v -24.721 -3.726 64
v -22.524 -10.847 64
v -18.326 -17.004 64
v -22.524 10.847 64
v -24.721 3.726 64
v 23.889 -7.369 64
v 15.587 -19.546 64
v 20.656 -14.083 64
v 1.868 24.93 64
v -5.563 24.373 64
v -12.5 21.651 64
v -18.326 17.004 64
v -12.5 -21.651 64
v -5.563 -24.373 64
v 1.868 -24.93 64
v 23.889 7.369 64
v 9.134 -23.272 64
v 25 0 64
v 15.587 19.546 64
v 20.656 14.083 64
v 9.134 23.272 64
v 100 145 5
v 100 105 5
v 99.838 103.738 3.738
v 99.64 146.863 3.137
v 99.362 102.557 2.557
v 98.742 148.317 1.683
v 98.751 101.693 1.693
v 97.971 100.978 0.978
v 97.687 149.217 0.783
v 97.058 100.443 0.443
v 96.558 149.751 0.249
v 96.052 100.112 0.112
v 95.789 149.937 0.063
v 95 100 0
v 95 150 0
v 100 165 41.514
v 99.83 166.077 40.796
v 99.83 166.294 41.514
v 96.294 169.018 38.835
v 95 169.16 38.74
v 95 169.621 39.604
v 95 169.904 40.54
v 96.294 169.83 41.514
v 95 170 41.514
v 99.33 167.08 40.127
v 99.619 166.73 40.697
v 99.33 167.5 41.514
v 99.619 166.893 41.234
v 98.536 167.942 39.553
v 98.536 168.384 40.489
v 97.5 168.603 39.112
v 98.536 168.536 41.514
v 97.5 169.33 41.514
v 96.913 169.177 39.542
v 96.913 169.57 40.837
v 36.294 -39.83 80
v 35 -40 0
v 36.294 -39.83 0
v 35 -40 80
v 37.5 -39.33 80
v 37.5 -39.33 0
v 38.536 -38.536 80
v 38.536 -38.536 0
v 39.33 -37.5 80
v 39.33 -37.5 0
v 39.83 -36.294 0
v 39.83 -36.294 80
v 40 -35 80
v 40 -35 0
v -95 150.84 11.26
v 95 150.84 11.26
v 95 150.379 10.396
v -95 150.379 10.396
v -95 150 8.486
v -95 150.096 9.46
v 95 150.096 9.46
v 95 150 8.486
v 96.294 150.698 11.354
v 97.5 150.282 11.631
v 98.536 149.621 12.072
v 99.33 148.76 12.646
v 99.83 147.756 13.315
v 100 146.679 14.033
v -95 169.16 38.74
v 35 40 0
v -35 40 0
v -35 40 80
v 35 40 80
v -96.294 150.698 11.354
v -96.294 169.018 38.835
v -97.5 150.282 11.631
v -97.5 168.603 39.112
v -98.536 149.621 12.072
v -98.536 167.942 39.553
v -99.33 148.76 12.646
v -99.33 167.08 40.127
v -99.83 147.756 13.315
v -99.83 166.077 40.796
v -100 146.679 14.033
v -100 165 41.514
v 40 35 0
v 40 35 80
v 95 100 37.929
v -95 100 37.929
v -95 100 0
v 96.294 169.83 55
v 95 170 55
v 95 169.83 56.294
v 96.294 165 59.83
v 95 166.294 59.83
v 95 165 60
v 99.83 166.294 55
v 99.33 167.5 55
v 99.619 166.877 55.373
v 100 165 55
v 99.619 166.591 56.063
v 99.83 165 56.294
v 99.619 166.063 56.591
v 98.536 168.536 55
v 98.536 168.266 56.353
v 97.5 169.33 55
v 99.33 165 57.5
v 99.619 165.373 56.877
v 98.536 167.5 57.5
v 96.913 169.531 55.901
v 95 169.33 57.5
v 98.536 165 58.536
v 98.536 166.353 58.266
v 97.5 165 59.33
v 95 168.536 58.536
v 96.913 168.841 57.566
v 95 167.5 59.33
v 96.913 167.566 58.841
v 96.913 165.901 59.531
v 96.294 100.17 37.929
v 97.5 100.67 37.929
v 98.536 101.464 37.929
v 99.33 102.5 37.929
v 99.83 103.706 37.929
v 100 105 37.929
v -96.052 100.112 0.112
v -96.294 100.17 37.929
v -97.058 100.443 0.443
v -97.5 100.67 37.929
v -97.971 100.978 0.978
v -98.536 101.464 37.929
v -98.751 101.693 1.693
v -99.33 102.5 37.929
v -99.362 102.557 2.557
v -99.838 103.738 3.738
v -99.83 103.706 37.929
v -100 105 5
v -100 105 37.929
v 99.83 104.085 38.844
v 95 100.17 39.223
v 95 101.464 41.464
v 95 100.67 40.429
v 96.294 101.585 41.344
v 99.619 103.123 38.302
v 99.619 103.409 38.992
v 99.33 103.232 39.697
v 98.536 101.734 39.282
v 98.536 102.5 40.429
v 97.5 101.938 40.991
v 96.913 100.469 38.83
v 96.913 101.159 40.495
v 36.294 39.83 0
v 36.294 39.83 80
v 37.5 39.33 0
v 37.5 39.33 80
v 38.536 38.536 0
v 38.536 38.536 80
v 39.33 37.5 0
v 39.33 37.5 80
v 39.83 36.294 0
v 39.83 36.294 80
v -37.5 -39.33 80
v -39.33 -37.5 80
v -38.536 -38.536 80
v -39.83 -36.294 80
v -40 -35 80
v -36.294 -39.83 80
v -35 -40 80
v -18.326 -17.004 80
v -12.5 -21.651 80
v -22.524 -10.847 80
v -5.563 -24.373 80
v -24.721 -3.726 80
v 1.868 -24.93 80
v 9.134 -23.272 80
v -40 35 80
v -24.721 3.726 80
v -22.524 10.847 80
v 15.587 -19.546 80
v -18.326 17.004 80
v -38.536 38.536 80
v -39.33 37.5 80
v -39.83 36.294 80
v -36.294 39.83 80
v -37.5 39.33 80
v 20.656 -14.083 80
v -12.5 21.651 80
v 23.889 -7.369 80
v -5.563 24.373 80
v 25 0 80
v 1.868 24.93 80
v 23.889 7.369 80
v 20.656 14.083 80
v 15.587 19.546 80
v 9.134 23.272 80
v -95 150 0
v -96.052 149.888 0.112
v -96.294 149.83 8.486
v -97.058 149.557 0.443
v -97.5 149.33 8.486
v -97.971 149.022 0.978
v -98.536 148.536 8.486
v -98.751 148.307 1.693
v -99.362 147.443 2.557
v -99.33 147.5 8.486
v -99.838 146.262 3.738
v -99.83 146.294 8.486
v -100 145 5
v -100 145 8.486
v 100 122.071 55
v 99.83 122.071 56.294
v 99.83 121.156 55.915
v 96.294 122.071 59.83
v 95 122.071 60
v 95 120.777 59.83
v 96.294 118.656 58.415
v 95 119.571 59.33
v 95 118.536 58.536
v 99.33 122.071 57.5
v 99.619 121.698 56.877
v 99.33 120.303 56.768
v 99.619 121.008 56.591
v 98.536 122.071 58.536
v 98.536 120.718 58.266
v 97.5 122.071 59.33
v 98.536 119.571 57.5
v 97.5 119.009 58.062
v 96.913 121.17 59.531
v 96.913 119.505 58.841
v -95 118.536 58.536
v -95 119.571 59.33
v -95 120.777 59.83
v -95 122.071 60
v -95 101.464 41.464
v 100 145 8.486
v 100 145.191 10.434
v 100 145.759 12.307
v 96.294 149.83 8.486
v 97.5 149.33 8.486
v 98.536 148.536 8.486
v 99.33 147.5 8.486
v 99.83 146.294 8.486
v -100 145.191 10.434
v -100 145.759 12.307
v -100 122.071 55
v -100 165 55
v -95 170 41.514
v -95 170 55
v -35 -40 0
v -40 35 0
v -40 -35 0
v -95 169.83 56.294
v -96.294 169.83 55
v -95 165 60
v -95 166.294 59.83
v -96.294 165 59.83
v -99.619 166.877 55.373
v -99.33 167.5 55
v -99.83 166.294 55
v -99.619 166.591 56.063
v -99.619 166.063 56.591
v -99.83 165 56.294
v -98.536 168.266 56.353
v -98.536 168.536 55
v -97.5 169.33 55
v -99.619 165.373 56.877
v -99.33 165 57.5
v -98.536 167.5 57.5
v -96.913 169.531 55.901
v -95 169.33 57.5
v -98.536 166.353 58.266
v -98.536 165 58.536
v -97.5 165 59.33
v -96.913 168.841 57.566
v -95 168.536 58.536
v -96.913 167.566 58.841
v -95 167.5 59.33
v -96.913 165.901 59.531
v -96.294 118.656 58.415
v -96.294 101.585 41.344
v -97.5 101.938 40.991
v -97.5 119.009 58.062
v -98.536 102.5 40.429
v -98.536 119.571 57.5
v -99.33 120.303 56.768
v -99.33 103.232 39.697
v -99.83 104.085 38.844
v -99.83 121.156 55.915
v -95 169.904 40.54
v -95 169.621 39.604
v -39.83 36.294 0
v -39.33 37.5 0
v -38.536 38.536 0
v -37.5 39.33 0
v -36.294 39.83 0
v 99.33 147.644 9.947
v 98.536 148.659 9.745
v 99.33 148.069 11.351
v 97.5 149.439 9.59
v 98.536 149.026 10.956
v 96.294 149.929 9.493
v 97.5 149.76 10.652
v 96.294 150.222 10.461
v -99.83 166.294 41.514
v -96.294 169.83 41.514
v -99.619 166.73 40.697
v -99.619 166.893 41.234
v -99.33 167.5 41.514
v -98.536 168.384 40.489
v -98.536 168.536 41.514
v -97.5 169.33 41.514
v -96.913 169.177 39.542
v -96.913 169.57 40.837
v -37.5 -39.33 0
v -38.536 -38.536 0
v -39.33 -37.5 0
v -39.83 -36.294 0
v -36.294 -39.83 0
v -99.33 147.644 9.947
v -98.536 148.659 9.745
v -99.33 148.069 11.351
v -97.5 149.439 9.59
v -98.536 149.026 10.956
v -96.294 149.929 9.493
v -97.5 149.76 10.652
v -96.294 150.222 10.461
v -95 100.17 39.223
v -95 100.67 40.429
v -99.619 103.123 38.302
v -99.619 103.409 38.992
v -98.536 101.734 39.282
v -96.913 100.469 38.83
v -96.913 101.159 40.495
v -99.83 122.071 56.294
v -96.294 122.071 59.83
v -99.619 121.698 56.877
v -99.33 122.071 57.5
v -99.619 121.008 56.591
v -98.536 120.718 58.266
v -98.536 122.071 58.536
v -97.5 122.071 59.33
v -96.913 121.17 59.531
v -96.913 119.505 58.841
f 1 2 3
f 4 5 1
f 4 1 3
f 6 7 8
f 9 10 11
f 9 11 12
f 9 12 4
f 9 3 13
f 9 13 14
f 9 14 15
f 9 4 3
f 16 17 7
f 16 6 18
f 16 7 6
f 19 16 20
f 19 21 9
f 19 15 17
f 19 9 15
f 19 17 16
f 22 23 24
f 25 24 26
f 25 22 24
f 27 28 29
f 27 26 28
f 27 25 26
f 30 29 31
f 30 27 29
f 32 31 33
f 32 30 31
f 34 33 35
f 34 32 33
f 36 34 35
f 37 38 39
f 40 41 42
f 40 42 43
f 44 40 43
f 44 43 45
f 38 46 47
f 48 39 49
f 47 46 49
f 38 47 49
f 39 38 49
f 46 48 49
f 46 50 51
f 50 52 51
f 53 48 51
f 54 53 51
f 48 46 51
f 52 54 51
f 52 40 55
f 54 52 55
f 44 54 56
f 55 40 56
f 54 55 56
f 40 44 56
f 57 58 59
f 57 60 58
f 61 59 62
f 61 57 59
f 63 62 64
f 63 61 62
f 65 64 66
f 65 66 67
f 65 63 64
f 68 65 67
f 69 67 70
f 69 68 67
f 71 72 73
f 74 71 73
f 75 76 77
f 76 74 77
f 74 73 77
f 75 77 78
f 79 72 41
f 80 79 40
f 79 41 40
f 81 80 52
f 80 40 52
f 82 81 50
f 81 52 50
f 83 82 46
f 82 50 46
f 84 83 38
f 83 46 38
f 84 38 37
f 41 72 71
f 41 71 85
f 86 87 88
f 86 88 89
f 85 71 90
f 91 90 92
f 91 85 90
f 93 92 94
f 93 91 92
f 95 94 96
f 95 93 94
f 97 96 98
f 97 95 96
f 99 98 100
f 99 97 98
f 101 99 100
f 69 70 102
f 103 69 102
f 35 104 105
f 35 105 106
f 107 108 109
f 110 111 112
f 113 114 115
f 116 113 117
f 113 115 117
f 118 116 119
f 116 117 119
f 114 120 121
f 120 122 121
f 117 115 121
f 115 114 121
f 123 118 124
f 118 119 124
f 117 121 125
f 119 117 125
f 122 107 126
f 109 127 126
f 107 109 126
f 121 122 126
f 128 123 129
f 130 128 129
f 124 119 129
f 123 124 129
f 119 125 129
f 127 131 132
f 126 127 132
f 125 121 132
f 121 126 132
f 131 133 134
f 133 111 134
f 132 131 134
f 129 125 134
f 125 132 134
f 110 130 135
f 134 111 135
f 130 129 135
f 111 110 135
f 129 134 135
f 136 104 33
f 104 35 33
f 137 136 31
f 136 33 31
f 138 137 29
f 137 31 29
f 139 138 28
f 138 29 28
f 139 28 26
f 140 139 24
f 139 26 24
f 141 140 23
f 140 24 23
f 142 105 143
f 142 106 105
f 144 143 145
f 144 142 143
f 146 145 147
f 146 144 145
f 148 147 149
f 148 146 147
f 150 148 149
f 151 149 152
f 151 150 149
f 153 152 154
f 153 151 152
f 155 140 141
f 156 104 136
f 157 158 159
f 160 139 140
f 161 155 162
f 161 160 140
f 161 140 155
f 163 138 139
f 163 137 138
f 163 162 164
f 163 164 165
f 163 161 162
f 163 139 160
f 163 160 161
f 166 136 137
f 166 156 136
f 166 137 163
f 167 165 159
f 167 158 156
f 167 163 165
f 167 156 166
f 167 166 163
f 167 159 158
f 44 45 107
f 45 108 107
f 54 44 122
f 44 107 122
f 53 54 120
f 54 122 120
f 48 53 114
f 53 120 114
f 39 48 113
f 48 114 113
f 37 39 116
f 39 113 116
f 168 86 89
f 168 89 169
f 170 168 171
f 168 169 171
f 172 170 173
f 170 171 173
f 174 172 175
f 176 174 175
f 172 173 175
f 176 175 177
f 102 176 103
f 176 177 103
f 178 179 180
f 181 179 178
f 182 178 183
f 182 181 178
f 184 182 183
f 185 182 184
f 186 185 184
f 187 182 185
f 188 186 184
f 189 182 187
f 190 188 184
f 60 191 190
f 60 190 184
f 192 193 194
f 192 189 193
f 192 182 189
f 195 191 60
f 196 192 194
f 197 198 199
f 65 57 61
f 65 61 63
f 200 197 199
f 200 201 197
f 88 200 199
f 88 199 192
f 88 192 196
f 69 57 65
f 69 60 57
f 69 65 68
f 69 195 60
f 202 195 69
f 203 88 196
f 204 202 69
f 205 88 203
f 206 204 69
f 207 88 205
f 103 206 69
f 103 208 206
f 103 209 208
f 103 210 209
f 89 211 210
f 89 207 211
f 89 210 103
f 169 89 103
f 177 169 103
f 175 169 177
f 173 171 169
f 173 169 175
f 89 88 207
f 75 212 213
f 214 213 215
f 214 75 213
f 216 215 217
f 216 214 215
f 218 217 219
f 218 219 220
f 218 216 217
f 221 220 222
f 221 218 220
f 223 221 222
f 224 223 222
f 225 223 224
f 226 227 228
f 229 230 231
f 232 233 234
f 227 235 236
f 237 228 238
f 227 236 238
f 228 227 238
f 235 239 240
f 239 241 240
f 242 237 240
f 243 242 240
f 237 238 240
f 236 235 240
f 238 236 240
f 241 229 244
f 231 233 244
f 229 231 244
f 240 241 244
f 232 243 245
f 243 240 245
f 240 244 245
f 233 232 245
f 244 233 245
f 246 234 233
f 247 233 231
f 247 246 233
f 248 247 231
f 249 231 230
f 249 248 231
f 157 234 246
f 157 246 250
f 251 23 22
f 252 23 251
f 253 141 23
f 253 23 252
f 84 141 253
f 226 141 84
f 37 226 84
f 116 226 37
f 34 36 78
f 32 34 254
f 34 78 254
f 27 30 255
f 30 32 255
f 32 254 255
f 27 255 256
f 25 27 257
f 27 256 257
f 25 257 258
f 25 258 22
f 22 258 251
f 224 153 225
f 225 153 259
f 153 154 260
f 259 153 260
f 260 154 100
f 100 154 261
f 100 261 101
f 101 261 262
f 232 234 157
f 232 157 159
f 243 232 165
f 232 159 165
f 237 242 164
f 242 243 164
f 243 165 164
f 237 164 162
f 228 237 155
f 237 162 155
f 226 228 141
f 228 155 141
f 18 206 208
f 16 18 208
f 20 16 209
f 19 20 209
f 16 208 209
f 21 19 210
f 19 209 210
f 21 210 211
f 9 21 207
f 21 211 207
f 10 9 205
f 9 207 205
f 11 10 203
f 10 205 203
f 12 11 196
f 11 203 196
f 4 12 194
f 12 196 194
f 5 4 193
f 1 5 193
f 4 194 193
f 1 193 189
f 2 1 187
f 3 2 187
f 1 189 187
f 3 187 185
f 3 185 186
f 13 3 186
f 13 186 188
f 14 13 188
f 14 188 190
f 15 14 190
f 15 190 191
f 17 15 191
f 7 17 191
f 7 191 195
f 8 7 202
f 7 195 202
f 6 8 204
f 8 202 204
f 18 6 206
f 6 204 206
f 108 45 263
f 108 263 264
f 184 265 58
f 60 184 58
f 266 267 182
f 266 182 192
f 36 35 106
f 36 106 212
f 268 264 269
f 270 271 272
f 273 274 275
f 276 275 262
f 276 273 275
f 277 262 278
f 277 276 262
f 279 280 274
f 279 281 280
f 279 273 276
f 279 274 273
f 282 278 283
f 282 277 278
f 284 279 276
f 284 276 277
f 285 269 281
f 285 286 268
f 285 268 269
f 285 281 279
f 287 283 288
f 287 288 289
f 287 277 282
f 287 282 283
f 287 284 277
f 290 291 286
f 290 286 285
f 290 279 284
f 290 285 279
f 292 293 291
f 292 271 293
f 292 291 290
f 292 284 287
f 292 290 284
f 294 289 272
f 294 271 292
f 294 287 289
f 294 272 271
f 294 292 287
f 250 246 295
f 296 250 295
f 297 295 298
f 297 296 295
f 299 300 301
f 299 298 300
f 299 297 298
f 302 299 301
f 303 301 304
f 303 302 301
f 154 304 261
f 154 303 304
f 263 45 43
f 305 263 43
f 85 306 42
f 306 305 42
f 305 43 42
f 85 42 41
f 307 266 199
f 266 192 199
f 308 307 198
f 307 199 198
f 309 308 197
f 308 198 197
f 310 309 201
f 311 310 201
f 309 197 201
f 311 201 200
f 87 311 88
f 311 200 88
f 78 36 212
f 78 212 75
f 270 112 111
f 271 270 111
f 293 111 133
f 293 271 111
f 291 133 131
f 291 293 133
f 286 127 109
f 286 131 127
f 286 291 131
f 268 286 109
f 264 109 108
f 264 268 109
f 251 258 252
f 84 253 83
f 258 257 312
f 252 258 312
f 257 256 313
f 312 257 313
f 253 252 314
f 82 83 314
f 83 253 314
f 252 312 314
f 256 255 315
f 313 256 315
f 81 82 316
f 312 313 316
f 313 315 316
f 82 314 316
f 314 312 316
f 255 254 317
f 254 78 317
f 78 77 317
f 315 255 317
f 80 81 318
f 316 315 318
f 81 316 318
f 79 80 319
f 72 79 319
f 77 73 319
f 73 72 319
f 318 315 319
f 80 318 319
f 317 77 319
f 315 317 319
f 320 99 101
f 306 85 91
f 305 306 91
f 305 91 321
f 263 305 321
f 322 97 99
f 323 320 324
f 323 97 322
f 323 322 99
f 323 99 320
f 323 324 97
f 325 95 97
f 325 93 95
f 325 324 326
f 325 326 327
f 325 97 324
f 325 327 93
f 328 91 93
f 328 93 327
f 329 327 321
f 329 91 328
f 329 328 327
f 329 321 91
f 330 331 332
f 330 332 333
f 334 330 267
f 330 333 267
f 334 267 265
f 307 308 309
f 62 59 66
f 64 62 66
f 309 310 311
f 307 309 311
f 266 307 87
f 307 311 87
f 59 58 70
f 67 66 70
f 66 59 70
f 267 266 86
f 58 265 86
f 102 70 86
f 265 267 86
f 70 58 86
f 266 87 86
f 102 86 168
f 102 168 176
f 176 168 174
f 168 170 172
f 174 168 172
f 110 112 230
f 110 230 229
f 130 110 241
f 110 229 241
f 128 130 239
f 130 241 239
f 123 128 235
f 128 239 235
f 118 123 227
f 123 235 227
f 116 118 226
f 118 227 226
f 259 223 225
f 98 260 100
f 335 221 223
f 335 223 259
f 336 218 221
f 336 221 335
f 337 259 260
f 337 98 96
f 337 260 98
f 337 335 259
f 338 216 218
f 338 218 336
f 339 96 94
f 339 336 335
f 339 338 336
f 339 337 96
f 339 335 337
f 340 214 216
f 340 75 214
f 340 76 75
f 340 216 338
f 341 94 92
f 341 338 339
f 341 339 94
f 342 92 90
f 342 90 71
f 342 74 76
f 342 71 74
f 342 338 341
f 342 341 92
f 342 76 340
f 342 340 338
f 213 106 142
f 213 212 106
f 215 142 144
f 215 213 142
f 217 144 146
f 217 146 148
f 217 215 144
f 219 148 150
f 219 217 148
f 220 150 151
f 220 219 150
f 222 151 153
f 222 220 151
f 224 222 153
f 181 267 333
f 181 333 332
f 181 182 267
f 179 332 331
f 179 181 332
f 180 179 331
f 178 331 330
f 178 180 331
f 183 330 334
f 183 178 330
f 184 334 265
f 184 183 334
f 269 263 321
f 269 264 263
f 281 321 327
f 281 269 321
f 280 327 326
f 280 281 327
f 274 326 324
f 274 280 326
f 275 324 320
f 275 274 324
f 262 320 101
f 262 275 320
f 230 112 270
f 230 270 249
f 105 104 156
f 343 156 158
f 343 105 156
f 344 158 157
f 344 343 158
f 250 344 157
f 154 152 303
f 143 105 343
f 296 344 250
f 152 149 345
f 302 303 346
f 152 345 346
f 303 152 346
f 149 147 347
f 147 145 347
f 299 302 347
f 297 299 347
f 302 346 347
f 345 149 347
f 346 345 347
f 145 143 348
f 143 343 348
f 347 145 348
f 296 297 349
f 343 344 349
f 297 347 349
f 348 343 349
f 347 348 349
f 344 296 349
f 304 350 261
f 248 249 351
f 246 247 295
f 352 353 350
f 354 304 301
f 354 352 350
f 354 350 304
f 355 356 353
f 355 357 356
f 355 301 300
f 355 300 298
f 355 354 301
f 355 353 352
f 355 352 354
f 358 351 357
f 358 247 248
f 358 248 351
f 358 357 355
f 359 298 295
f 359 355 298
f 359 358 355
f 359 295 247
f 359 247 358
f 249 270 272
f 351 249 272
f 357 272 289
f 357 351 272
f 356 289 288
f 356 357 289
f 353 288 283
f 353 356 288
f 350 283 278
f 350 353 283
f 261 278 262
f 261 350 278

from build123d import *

# Parameters (mm, degrees)
F0_W          = 80
F0_H          = 80
F1_DEPTH      = 80
F2_R          = 25
F3_DEPTH      = 16
F4_R          = 5
F6_DEPTH      = 100
F6_DEPTH_BACK = 100
F7_R          = 5


with BuildPart() as f1:
    # F0 (on Top) → F1 (new body)
    with BuildSketch(Plane.XY):
        Rectangle(F0_W, F0_H)
    extrude(amount=F1_DEPTH)

    # F2 (on face) → F3 (cut)
    with BuildSketch(Plane.XY.offset(80)):
        Circle(F2_R)
    extrude(amount=-F3_DEPTH, mode=Mode.SUBTRACT)

    # F4
    f4_edges = [f1.edges().sort_by_distance(p)[0] for p in [
        (-40, -40, 40),
        (-40, 40, 40),
        (40, 40, 40),
        (40, -40, 40),
    ]]
    fillet(f4_edges, radius=F4_R)


with BuildPart() as f6:
    # F5 (on Right) → F6 (new body, two sides)
    with BuildSketch(Plane.YZ) as f6_sk:
        Polygon((100, 40), (100, 0), (150, 0), (150, 10), (170, 40), (170, 60), (120, 60), align=None)
    extrude(amount=F6_DEPTH)
    extrude(f6_sk.sketch, amount=-F6_DEPTH_BACK)

    # F7
    f7_edges = [f6.edges().sort_by_distance(p)[0] for p in [
        (0, 100, 40),
        (0, 120, 60),
        (0, 170, 60),
        (0, 170, 40),
        (0, 150, 10),
        (100, 100, 20),
        (100, 125, 0),
        (100, 150, 5),
        (100, 160, 25),
        (100, 170, 50),
        (100, 145, 60),
        (100, 110, 50),
        (-100, 100, 20),
        (-100, 125, 0),
        (-100, 150, 5),
        (-100, 160, 25),
        (-100, 170, 50),
        (-100, 145, 60),
        (-100, 110, 50),
    ]]
    fillet(f7_edges, radius=F7_R)


solid = Compound([f1.part, f6.part])
